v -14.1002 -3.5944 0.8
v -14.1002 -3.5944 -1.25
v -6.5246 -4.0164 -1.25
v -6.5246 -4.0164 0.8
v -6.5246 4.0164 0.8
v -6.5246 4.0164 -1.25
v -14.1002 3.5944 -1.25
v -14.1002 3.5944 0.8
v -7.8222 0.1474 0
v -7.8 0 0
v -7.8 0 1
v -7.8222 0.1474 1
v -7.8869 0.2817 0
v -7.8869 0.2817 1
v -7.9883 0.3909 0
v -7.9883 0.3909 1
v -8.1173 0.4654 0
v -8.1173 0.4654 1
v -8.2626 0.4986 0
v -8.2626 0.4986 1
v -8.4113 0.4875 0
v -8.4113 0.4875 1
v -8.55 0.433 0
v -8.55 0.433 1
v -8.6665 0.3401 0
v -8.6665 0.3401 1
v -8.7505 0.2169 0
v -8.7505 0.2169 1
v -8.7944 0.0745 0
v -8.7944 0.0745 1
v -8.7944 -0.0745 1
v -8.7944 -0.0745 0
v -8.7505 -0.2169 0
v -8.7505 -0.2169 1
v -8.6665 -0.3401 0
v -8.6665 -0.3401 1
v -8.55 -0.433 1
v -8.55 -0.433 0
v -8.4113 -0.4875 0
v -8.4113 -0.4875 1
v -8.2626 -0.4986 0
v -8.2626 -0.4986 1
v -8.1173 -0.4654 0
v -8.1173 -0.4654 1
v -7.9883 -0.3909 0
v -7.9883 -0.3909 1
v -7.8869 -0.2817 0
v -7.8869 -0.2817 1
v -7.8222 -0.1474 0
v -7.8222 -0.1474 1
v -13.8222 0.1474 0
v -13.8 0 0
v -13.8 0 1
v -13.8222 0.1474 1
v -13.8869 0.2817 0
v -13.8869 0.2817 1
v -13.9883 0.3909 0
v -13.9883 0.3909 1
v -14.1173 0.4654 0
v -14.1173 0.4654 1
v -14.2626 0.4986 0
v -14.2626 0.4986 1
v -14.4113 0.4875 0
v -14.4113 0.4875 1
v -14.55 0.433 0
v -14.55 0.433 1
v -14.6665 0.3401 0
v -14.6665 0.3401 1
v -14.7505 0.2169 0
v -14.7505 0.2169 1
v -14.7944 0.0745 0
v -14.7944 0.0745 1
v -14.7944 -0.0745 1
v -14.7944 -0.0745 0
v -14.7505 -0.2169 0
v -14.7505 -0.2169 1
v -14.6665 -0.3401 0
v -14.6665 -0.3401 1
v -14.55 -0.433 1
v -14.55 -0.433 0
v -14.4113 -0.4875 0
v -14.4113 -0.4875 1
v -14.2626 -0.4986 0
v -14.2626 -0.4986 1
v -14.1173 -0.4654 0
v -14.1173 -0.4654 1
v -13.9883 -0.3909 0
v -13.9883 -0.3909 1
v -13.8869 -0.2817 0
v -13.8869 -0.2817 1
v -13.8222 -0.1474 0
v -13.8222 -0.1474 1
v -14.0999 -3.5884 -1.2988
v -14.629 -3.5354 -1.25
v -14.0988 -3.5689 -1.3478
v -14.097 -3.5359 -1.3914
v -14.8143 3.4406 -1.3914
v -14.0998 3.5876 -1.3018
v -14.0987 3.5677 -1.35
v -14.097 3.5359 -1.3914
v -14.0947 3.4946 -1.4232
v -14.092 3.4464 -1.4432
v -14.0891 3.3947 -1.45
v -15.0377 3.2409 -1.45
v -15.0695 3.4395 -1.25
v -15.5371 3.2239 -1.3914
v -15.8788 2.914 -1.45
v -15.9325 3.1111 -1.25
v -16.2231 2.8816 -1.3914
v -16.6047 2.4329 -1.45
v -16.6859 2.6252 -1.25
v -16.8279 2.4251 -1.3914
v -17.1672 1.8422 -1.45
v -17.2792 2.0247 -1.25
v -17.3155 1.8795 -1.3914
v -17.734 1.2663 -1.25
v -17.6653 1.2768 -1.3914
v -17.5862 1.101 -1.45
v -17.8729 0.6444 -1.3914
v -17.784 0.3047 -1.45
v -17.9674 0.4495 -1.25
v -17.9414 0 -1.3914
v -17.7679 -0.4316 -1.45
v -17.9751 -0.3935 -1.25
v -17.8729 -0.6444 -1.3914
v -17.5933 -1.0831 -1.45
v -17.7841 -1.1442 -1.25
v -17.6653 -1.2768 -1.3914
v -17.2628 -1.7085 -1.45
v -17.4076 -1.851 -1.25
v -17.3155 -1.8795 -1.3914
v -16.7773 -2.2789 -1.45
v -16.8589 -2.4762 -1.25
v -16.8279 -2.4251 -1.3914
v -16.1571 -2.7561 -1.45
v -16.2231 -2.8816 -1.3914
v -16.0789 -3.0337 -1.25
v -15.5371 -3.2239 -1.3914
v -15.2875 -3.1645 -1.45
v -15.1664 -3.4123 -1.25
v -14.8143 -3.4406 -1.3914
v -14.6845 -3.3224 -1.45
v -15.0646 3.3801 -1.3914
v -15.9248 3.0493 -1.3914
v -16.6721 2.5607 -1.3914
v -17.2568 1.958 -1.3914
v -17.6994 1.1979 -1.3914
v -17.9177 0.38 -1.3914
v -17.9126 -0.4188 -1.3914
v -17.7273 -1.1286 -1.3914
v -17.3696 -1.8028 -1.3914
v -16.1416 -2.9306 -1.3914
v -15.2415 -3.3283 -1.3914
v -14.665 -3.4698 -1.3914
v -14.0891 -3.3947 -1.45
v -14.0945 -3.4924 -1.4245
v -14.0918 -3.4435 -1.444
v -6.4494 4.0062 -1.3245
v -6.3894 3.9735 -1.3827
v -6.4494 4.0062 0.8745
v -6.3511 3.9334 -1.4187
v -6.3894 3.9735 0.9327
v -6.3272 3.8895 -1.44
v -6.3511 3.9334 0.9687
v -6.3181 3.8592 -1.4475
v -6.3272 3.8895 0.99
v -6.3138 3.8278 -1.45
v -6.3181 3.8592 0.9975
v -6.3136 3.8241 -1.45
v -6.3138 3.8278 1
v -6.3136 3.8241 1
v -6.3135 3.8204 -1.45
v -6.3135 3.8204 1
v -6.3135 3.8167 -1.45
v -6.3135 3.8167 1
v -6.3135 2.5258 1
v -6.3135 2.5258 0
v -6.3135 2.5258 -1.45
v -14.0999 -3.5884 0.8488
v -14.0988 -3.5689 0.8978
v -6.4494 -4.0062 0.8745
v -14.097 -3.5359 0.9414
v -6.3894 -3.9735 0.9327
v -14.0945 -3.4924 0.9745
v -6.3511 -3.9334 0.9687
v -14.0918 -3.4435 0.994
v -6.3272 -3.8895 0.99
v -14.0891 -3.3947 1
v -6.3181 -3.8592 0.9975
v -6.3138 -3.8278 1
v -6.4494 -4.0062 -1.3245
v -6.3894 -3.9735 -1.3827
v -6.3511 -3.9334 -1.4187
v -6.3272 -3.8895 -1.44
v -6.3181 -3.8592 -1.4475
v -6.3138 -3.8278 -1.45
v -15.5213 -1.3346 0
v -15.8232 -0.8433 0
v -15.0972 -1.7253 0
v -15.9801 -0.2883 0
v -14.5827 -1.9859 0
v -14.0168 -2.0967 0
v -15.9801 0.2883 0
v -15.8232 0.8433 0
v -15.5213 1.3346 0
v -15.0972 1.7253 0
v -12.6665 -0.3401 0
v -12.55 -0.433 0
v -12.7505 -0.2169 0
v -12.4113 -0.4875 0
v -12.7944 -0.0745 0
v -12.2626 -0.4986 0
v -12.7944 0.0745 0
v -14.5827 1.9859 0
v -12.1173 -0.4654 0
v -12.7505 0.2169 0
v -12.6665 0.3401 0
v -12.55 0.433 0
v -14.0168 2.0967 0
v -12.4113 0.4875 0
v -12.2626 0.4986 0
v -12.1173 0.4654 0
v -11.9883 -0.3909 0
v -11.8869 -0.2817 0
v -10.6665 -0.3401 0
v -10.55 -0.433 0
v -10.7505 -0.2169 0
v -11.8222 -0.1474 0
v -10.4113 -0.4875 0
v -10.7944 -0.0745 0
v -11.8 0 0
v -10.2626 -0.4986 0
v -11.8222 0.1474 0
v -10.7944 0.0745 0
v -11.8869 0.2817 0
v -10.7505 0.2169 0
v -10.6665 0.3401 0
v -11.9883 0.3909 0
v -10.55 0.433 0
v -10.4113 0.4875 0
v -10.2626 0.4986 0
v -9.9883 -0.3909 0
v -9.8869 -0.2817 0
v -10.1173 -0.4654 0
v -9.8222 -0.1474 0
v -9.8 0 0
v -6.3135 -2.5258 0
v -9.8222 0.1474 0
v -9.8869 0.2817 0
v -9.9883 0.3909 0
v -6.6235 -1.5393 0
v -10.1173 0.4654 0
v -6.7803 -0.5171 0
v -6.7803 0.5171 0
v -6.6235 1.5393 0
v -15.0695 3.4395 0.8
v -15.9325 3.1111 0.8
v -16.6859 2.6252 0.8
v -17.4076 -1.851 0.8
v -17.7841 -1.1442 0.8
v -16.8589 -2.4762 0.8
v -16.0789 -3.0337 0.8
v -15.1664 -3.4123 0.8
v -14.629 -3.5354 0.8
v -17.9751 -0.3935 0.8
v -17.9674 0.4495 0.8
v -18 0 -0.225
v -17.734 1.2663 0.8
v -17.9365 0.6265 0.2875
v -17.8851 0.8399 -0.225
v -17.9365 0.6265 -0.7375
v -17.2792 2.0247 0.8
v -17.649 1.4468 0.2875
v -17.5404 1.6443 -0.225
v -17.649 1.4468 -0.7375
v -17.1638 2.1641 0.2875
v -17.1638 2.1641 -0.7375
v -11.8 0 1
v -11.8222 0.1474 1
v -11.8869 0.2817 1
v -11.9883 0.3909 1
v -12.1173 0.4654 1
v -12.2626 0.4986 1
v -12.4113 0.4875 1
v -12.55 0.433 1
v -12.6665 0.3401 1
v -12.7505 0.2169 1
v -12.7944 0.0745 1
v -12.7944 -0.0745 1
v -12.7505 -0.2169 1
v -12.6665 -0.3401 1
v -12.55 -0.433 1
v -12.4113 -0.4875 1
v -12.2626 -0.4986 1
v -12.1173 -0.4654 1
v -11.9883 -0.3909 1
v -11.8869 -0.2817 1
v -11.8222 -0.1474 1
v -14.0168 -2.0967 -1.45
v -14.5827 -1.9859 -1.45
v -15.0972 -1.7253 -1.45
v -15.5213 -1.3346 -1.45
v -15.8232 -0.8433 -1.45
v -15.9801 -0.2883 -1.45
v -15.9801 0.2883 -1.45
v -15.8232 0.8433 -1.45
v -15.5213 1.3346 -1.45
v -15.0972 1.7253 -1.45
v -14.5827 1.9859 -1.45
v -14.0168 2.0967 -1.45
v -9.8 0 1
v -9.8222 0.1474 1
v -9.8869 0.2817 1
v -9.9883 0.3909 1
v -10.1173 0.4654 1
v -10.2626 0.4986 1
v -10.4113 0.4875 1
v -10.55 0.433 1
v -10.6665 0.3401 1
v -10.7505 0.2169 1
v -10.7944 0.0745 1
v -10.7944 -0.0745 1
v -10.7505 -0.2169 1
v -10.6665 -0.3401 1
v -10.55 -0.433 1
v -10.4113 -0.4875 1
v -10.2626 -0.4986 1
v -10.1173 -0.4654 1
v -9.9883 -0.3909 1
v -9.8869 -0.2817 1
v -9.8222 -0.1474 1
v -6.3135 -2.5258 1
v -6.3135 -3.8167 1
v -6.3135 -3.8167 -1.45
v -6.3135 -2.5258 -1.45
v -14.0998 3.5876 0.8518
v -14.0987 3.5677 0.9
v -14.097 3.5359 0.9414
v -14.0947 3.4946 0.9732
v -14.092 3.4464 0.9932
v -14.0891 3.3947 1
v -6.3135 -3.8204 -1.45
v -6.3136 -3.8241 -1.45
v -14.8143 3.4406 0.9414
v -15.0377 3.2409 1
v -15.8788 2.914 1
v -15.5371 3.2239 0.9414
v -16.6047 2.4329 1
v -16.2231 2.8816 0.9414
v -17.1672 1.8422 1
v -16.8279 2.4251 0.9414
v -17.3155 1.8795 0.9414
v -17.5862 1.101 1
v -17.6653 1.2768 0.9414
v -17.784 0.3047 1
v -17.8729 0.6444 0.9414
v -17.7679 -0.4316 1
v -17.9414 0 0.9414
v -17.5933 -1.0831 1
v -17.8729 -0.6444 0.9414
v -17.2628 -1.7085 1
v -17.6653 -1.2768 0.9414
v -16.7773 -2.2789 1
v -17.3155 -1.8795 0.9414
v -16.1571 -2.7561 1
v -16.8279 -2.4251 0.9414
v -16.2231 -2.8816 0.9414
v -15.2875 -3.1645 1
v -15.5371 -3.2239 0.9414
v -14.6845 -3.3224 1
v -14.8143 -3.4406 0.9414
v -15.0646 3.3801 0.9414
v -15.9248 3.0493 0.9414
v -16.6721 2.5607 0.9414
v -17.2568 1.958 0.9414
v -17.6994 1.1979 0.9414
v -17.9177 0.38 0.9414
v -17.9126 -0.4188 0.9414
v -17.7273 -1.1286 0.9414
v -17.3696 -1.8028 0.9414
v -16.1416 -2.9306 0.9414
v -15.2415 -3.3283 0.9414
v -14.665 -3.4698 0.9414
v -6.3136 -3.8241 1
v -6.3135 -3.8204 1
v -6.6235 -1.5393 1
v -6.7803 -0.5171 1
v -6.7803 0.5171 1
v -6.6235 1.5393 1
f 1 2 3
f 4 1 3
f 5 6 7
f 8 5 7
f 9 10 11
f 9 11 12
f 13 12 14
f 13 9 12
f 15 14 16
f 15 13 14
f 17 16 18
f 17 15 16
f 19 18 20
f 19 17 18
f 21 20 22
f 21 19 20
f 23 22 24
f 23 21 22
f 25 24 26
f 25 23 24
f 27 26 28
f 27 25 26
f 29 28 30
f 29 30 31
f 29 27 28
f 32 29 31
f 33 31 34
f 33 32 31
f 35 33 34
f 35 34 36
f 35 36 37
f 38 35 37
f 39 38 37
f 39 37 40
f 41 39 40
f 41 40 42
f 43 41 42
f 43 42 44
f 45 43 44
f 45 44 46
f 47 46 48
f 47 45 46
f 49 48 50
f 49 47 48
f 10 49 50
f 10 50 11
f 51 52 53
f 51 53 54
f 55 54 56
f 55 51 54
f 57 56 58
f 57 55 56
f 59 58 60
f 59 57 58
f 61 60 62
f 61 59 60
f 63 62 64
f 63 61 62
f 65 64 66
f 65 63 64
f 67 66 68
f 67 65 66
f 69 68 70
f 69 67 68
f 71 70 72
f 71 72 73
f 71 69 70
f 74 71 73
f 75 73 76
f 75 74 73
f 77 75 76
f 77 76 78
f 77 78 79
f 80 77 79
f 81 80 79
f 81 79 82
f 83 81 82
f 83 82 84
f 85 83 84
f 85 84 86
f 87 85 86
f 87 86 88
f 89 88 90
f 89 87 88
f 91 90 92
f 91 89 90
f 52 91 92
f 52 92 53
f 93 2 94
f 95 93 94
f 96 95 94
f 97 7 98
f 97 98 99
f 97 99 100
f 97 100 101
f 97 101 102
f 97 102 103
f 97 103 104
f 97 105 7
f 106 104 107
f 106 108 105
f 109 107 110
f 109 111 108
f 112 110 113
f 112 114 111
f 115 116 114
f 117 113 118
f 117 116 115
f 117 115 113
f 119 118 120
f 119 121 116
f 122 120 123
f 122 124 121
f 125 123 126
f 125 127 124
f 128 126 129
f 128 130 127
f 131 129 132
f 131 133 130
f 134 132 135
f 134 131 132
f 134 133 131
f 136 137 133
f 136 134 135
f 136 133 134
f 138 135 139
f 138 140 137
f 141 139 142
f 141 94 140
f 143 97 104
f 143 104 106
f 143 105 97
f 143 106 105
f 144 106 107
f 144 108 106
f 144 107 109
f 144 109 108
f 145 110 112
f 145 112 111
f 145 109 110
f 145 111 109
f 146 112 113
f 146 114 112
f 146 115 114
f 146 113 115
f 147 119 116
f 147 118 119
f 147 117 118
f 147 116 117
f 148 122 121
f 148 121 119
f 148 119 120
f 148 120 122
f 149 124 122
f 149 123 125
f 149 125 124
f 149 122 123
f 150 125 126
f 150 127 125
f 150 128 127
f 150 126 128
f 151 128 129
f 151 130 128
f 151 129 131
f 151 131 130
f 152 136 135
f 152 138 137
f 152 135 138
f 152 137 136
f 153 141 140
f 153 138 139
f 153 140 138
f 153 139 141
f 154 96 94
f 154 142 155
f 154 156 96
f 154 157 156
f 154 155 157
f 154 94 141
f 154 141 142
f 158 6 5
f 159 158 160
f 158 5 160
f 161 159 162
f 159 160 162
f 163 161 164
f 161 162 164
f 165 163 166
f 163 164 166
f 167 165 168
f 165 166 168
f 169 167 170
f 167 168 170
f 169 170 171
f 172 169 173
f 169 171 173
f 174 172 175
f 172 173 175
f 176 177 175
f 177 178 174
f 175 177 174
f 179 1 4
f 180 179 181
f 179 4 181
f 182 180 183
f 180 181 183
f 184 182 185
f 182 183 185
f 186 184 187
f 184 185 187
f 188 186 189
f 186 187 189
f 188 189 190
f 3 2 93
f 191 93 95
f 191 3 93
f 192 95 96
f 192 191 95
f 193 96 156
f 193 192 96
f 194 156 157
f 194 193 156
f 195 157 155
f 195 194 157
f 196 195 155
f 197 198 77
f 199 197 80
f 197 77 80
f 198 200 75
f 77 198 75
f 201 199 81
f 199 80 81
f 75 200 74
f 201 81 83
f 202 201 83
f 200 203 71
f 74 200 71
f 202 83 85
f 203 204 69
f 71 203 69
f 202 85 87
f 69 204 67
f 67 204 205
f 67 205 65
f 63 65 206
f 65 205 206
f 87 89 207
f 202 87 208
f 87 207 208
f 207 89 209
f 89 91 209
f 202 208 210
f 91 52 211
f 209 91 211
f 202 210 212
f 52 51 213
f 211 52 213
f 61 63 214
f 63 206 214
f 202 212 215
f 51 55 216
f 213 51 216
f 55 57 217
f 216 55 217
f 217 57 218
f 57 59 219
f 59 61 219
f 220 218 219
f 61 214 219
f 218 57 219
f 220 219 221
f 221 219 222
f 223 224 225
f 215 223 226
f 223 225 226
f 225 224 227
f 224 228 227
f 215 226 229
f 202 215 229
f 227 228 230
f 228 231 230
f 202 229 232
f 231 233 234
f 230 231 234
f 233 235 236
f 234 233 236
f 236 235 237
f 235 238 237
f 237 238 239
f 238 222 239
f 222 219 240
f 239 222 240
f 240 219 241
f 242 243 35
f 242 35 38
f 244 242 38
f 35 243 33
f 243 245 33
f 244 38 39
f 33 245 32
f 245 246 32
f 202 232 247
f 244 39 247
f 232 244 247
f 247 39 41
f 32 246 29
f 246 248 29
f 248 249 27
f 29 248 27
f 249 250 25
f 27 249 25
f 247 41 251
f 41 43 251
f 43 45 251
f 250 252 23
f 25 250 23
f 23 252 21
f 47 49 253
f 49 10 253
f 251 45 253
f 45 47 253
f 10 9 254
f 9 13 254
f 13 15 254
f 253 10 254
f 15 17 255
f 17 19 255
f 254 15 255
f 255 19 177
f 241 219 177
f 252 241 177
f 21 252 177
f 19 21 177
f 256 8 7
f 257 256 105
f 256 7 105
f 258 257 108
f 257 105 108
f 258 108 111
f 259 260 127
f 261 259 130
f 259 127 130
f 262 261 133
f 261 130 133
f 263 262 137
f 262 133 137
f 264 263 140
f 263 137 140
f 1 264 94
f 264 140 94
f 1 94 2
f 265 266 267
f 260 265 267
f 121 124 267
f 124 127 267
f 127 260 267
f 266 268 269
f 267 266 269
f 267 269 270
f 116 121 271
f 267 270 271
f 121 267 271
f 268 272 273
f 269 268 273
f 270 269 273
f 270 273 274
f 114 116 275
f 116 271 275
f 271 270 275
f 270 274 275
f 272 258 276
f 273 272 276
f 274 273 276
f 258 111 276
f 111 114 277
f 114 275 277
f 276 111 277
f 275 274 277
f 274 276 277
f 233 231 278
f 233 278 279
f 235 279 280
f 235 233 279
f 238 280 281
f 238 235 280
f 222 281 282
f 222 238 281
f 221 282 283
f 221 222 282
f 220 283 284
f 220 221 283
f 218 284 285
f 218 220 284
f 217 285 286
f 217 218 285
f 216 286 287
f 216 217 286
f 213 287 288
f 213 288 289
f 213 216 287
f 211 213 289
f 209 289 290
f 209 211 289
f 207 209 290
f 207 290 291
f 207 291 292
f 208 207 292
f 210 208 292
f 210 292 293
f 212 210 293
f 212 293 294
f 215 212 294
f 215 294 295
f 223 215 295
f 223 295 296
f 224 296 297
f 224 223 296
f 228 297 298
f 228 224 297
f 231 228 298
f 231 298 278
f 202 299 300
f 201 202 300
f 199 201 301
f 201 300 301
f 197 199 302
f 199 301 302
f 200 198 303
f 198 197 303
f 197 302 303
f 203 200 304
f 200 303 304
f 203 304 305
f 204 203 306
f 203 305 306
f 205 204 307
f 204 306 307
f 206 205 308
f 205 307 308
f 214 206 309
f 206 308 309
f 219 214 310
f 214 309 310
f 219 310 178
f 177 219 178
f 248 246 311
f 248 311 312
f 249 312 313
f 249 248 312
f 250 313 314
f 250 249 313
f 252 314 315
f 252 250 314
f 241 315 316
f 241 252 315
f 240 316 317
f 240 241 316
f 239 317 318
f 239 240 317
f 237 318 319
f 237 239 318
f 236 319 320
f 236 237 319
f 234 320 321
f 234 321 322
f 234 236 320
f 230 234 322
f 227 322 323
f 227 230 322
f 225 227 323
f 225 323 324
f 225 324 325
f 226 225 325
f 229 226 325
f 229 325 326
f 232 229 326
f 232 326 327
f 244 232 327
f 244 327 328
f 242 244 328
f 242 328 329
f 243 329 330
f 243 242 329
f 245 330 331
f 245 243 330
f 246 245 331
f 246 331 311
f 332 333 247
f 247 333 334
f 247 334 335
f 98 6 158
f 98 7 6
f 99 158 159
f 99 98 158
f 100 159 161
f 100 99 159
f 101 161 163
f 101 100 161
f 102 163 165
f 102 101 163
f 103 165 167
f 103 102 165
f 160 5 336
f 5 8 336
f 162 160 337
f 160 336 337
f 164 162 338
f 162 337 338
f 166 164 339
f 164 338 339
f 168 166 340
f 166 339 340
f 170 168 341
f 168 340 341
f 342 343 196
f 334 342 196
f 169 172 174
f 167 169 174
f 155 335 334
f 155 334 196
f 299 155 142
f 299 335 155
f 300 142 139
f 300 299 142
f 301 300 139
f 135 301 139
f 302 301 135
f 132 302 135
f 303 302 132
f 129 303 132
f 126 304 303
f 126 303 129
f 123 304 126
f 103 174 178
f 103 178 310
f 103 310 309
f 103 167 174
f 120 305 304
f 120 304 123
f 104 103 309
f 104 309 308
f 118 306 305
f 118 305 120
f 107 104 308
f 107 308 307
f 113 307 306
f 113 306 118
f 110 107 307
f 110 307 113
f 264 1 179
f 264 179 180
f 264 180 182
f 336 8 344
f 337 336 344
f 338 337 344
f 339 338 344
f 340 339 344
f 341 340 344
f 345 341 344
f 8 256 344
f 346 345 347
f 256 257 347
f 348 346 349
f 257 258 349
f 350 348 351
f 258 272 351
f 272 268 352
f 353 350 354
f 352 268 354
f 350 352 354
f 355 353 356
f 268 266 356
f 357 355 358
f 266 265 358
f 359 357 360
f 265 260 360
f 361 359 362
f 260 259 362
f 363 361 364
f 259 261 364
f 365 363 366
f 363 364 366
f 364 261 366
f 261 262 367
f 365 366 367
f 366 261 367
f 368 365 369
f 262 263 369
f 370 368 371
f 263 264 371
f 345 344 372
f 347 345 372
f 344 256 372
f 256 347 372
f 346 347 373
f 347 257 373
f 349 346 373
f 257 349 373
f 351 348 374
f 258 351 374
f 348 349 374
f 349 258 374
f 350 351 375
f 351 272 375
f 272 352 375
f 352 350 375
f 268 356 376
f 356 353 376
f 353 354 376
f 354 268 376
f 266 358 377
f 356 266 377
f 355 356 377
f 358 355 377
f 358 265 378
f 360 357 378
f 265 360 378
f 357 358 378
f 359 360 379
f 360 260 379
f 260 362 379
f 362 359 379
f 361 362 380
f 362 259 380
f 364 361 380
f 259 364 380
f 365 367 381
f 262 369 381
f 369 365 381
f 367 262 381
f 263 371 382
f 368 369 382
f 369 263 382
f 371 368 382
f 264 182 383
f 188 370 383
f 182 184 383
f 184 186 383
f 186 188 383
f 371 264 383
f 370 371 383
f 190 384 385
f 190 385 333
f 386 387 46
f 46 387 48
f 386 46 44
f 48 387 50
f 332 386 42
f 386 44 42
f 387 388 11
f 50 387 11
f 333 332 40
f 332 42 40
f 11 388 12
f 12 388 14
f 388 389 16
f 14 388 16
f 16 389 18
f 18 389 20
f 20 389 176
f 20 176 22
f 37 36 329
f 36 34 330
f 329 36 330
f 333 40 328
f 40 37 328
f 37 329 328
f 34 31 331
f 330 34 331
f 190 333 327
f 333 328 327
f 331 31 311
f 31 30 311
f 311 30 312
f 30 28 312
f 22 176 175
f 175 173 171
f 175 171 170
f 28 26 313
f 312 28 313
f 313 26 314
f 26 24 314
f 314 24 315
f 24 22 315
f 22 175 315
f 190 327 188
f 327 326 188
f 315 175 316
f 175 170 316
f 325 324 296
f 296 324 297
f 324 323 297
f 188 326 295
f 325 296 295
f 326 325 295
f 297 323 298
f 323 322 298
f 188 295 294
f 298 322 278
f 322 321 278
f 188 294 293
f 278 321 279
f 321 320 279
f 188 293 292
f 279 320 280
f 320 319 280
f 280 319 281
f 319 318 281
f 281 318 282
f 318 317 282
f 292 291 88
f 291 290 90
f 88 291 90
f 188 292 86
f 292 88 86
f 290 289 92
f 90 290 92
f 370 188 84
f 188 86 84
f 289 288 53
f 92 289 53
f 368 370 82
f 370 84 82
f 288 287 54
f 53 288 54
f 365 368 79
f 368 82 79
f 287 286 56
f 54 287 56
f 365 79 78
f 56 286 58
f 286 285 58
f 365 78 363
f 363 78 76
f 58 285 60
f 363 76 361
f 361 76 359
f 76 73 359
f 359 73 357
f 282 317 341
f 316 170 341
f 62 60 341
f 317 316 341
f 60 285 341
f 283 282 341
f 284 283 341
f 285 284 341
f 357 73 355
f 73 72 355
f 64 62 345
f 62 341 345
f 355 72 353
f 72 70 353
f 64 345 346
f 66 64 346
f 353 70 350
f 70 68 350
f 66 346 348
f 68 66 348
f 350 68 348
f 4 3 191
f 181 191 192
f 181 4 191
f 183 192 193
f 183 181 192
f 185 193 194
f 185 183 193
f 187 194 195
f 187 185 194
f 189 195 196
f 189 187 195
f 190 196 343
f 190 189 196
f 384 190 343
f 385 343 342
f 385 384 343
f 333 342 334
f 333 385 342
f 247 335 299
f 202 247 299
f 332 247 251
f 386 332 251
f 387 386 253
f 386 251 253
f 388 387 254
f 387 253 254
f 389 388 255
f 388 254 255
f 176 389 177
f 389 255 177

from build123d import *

# Parameters (mm, degrees)
SKETCH_1_R         = 0.5
EXTRUDE_1_DEPTH    = 1
EXTRUDE_START      = -2.45
EXTRUDE_2_DEPTH    = 2.45
EXTRUDE_1388_DEPTH = 2.45
FILLET_1_R         = 0.2


with BuildPart() as part:
    # 草图1 → 凸台-拉伸1 (new body)
    with BuildSketch(Plane.XY):
        with BuildLine():
            Line((-14.016792693, -2.096749739), (-6.313489141, -2.525837459))
            ThreePointArc((-6.313489141, -2.525837459), (-6.8, 0), (-6.313489141, 2.525837459))
            Line((-6.313489141, 2.525837459), (-14.016792693, 2.096749739))
            ThreePointArc((-14.016792693, 2.096749739), (-16, 0), (-14.016792693, -2.096749739))
        make_face()
        with Locations((-10.3, 0)):
            Circle(SKETCH_1_R, mode=Mode.SUBTRACT)
        with Locations((-14.3, 0)):
            Circle(SKETCH_1_R, mode=Mode.SUBTRACT)
        with Locations((-8.3, 0)):
            Circle(SKETCH_1_R, mode=Mode.SUBTRACT)
        with Locations((-12.3, 0)):
            Circle(SKETCH_1_R, mode=Mode.SUBTRACT)
    extrude(amount=EXTRUDE_1_DEPTH)

    # 草图3 → 凸台-拉伸2 (add)
    with BuildSketch(Plane.XY.offset(1).offset(EXTRUDE_START)):
        with BuildLine():
            Line((-6.313489141, 4.028162673), (-14.100216045, 3.594428124))
            ThreePointArc((-14.100216045, 3.594428124), (-17.5, 0), (-14.100216045, -3.594428124))
            Line((-14.100216045, -3.594428124), (-6.313489141, -4.028162673))
            Line((-6.313489141, -4.028162673), (-6.313489141, -2.525837459))
            Line((-6.313489141, -2.525837459), (-14.016792693, -2.096749739))
            ThreePointArc((-14.016792693, -2.096749739), (-16, 0), (-14.016792693, 2.096749739))
            Line((-14.016792693, 2.096749739), (-6.313489141, 2.525837459))
            Line((-6.313489141, 2.525837459), (-6.313489141, 4.028162673))
        make_face()
    extrude(amount=EXTRUDE_2_DEPTH)

    # 草图4 → Extrude 1388 (add)
    with BuildSketch(Plane.XY.offset(1).offset(EXTRUDE_START)):
        with BuildLine():
            ThreePointArc((-14.100216045, 3.594428124), (-17.5, 0), (-14.100216045, -3.594428124))
            add(Edge.make_bspline(
                [(-14.100216045, 3.594428124), (-18, 3.377203216), (-18, 0), (-18, -3.377203216), (-14.100216045, -3.594428124)],
                knots=[1.635161708, 1.635161708, 1.635161708, 3.141592654, 3.141592654, 4.6480236, 4.6480236, 4.6480236], degree=2, weights=[1, 0.729493299, 1, 0.729493299, 1]))
        make_face()
    extrude(amount=EXTRUDE_1388_DEPTH)

    # 圆角1
    fillet_1_edges = [part.edges().sort_by_distance(p)[0] for p in [
        (-10.206852593, 3.811295398, 1),
        (-10.206852593, -3.811295398, 1),
        (-10.206852593, -3.811295398, -1.45),
        (-6.313489141, -4.028162673, -0.225),
        (-6.313489141, 4.028162673, -0.225),
        (-10.206852593, 3.811295398, -1.45),
        (-18, 0, 1),
        (-18, 0, -1.45),
    ]]
    fillet(fillet_1_edges, radius=FILLET_1_R)


solid = part.part
